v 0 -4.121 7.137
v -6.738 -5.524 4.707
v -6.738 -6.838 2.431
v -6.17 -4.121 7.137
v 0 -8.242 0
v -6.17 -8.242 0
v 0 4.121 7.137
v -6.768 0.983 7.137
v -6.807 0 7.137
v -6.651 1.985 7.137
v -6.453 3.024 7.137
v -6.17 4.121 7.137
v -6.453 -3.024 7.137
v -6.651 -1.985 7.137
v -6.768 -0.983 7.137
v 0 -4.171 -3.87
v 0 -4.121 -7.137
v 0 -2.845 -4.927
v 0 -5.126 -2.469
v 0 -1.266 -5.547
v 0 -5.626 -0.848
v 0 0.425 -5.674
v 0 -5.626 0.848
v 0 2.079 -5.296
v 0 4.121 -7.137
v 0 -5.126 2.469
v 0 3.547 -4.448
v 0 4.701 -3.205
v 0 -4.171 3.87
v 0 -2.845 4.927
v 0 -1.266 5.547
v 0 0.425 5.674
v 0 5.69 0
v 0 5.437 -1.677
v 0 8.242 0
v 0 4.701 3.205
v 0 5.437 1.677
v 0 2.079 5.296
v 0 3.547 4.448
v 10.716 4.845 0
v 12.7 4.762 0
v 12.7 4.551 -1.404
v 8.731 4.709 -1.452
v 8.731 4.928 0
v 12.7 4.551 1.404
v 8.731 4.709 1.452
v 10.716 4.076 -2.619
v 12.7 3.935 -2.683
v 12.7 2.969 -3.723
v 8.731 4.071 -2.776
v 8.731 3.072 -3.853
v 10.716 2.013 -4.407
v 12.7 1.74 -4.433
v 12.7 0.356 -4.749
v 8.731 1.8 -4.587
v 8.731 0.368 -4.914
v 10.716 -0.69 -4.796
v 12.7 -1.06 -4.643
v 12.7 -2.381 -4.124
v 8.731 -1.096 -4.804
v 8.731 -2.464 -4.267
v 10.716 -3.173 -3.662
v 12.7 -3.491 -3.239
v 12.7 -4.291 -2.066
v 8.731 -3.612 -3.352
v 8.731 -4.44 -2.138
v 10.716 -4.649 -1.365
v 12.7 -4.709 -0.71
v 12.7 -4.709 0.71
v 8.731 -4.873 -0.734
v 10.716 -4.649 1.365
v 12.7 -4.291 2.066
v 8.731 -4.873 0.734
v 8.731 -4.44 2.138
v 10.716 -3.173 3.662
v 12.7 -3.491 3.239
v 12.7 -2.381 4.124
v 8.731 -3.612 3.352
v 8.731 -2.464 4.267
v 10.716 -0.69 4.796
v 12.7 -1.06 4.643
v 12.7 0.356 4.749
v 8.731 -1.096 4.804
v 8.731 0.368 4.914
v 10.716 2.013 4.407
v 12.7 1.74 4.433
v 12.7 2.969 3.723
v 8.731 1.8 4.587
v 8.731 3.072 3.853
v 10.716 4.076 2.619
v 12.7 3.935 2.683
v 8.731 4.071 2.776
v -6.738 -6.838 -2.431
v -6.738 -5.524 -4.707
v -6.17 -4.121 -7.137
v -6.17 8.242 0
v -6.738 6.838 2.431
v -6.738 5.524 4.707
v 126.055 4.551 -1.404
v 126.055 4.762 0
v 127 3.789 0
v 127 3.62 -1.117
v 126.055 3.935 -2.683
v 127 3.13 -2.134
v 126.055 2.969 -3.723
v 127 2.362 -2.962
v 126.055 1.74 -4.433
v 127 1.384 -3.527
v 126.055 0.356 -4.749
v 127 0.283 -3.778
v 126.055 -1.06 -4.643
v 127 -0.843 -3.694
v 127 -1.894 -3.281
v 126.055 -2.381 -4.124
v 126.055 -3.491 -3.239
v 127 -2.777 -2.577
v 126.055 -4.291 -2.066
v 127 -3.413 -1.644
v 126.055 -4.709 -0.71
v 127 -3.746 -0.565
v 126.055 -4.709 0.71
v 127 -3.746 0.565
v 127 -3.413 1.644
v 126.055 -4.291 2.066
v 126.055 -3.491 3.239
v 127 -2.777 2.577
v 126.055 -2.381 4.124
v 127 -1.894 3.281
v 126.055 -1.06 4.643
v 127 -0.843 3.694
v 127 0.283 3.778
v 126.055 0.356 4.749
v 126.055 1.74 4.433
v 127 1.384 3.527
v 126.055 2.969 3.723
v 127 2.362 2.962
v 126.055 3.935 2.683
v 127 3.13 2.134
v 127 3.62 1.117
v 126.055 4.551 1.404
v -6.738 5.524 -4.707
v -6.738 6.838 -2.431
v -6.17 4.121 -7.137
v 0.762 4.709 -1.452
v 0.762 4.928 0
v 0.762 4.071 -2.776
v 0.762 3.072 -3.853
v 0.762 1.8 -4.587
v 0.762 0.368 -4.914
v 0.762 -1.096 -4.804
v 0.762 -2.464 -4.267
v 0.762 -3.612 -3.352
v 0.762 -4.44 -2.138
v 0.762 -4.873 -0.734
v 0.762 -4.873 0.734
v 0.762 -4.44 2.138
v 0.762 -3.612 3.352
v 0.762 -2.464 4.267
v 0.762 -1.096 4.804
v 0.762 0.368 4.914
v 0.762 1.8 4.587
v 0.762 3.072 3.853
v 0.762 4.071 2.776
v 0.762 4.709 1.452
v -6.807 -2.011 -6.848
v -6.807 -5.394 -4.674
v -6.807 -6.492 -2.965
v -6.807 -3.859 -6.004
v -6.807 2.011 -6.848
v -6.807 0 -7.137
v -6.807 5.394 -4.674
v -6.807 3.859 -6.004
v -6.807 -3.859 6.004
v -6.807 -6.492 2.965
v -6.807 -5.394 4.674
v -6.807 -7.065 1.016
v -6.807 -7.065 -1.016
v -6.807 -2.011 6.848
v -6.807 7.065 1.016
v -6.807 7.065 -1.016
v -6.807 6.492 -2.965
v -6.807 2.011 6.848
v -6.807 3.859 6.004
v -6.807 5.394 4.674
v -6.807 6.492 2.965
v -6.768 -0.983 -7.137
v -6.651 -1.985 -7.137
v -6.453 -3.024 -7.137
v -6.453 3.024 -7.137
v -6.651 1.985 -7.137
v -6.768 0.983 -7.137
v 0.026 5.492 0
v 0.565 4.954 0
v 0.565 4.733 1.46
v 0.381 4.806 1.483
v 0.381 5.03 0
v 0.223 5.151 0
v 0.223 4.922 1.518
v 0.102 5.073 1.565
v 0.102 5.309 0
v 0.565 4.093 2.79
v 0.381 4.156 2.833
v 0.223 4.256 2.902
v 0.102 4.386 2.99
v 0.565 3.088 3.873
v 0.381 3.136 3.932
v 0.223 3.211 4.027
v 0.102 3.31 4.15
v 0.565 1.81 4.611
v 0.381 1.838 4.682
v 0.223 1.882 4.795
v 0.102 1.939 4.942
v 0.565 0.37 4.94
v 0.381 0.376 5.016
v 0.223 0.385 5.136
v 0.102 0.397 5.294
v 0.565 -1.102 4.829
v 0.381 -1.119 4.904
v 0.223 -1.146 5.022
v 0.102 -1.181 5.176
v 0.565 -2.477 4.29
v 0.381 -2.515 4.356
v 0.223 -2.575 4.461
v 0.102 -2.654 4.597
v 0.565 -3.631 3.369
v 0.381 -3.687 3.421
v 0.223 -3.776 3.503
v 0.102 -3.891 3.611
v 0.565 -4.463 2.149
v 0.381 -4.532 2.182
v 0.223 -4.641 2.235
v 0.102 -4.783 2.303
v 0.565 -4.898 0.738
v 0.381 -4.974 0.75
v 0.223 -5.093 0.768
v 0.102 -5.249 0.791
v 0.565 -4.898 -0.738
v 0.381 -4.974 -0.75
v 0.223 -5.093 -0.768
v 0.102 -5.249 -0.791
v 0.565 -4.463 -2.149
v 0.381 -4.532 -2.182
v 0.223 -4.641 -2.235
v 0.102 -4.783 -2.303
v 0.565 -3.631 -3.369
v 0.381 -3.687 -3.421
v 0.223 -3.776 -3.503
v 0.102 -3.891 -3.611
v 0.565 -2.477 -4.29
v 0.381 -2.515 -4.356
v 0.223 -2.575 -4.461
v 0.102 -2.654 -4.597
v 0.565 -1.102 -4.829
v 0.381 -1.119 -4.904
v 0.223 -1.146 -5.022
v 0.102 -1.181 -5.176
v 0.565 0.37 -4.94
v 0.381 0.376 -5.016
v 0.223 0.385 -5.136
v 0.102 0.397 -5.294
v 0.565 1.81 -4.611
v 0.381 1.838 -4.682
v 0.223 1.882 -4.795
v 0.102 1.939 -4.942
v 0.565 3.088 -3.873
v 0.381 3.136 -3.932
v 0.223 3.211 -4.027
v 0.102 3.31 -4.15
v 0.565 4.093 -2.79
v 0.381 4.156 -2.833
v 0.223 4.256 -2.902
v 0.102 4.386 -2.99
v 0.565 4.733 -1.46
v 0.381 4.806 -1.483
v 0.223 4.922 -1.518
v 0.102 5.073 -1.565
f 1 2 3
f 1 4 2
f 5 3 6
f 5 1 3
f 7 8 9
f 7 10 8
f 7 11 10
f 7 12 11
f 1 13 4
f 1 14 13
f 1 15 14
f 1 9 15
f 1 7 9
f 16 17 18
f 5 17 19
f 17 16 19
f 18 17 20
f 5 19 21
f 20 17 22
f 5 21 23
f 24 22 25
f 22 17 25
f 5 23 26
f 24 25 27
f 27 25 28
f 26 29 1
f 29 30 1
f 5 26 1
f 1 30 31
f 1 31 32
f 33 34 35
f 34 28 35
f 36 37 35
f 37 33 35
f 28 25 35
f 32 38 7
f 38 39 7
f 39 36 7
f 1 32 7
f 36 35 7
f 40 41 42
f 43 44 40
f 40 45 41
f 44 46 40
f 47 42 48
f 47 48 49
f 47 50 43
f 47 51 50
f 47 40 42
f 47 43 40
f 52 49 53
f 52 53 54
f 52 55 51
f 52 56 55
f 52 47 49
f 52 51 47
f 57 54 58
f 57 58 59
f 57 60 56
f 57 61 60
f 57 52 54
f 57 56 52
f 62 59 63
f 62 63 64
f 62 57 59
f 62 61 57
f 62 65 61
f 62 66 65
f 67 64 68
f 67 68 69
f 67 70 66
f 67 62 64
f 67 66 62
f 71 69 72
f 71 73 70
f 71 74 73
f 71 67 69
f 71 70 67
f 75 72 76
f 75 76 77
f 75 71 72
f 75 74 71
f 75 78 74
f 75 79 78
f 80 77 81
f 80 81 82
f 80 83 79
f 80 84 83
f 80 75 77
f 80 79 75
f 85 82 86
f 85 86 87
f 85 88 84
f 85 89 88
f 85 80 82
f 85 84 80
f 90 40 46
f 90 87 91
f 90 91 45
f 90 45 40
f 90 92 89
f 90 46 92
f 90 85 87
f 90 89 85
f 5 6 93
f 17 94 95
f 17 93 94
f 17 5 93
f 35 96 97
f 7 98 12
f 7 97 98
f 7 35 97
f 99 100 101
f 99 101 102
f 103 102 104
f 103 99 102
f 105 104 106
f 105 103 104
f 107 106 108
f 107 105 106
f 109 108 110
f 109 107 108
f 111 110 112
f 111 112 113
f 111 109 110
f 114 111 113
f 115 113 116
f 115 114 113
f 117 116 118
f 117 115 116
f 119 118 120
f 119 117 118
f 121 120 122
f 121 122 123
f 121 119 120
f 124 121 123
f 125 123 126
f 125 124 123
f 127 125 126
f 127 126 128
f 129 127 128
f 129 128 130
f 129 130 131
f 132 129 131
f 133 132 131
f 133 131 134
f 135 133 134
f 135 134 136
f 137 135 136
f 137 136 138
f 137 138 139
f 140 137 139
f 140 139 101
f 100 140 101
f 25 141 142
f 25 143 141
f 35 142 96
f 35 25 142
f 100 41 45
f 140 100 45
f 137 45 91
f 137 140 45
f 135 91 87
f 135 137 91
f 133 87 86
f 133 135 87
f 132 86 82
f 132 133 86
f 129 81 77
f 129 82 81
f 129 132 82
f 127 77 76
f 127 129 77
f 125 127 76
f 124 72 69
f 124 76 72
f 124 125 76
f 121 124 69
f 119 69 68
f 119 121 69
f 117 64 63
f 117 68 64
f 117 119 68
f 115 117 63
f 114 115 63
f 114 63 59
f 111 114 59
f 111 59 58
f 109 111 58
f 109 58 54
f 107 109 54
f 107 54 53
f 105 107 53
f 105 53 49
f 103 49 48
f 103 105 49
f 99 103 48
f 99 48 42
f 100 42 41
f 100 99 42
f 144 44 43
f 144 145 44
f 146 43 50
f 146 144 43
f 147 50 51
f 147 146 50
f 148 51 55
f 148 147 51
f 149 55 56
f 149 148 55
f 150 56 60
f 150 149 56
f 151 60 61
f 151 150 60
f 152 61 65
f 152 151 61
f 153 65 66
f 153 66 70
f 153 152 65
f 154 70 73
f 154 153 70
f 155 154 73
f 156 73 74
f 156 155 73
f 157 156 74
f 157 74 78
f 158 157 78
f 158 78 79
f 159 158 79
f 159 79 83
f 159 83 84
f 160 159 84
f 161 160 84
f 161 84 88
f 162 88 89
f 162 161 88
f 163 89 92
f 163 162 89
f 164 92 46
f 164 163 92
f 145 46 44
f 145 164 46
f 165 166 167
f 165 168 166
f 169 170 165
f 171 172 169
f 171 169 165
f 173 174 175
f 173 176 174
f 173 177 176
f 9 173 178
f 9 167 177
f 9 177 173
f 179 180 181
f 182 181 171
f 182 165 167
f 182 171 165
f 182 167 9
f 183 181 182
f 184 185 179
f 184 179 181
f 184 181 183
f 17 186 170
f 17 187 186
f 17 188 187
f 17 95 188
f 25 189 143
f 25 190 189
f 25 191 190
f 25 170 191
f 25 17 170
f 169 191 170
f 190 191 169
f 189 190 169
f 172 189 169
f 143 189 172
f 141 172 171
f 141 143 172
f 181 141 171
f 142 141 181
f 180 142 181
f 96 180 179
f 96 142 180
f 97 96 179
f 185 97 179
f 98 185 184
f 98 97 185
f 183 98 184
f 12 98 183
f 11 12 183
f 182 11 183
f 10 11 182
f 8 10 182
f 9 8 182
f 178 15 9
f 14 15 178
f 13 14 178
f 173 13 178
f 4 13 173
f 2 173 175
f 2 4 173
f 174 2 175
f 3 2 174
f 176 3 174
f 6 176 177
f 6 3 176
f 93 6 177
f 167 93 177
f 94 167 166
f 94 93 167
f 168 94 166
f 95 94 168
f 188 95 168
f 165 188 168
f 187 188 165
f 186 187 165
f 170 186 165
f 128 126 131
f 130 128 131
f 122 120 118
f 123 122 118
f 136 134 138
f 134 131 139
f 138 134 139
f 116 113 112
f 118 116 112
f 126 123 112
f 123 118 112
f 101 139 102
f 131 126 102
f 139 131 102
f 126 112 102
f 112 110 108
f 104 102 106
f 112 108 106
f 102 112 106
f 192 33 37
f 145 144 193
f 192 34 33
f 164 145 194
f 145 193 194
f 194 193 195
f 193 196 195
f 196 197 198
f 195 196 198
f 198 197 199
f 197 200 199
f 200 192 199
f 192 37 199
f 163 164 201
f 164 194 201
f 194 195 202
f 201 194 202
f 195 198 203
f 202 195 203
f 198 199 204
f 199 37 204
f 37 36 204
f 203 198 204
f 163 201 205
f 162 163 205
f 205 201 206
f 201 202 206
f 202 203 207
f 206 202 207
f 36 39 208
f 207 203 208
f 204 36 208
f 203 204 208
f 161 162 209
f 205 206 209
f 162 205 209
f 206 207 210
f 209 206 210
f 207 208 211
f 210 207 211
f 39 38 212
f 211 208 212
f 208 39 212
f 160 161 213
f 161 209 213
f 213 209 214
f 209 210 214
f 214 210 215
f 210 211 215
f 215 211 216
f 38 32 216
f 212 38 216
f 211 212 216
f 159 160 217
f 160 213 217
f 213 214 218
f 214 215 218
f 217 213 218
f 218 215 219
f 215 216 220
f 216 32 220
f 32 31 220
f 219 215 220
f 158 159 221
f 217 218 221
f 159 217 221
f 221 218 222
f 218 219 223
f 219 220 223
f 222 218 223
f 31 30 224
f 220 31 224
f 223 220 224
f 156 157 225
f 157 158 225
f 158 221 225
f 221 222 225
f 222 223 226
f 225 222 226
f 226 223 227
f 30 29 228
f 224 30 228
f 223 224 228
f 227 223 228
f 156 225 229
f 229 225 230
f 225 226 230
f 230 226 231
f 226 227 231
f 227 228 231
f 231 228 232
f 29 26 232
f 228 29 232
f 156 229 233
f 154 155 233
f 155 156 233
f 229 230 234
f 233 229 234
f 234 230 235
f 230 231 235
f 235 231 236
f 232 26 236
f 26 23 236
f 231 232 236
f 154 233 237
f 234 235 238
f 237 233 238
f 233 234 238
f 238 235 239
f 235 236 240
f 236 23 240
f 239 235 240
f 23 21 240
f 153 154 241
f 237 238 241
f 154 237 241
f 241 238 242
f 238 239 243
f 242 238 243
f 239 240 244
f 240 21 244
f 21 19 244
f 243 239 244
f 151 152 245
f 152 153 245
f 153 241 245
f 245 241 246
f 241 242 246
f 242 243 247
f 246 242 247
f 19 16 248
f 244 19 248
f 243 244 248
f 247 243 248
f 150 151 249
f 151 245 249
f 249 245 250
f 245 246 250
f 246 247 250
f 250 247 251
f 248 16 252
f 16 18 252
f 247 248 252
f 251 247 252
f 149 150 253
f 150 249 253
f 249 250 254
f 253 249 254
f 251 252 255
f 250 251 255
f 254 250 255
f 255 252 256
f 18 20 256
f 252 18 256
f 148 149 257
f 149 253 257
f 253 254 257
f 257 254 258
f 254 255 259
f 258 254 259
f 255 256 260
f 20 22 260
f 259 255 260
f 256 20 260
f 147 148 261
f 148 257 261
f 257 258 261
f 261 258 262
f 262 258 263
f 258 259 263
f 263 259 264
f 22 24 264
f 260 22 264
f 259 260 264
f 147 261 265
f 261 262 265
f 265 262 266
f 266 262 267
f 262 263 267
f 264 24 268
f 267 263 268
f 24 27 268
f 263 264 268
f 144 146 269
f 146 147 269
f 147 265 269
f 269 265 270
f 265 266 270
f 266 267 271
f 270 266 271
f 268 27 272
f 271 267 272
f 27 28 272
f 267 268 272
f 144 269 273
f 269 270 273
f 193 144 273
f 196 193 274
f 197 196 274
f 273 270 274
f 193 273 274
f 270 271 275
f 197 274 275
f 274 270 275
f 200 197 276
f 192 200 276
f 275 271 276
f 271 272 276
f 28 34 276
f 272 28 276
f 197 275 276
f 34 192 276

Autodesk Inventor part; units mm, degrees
ref_plane "YZ Plane" through (0, 0, 0) normal (1, 0, 0) x (0, 1, 0)
ref_plane "XZ Plane" through (0, 0, 0) normal (0, 1, 0) x (-1, 0, 0)
sketch "Sketch1" plane through (0, 0, 0) normal (0, 0, 1) x (1, 0, 0)
  line L0 (0, 7.1374) -> (0, 4.9276)
  line L1 (12.7, 4.7625) -> (127, 4.7625)
  line L2 (127, 4.7625) -> (127, 0)
  line L3 (127, 0) -> (-0.0001, 0)
  line L4 (-25.4001, 0) -> (152.4, 0) projected
  line L5 (-0.0001, 0) -> (-0.0001, 7.1374)
  line L6 (-0.0001, 7.1374) -> (0, 7.1374)
  line L7 (12.7, 4.7625) -> (8.7311, 4.9276)
  line L8 (8.7311, 4.9276) -> (0, 4.9276)
  line L9 (0, -1.4275) -> (0, 8.5649) projected
  dimension "d0" = 127
  dimension "d1" = 114.3
revolve "Body" add sketch "Sketch1" angle 360 about axis through (127, 0, 0) along (-1, 0, 0)
sketch "Sketch2" plane through (-0.0001, 0, 0) normal (-1, 0, 0) x (0, 0, 1)
  line L0 (0, 8.2416) -> (7.1374, 4.1208)
  line L1 (7.1374, 4.1208) -> (7.1374, -4.1208)
  line L2 (7.1374, -4.1208) -> (0, -8.2416)
  line L3 (0, -8.2416) -> (-7.1374, -4.1208)
  line L4 (-7.1374, -4.1208) -> (-7.1374, 4.1208)
  line L5 (-7.1374, 4.1208) -> (0, 8.2416)
  point P0 (0, 0)
  point P1 (0, 0)
  dimension "d11" = 14.2748
extrude "Head" add sketch "Sketch2" along normal blind 6.8072
sketch "Sketch4" plane through (0, 0, 0) normal (0, 0, 1) x (1, 0, 0)
  line L0 (-6.8073, 7.1374) -> (-6.8073, 8.2416)
  line L1 (-6.8073, 8.2416) -> (-6.1698, 8.2416)
  line L2 (-6.1698, 8.2416) -> (-6.8073, 7.1374)
  line L3 (-8.1687, 0) -> (1.3613, 0) projected
  line L4 (-0.0001, 8.2416) -> (-6.8073, 8.2416) projected
  line L5 (-6.8073, 4.1208) -> (-6.8073, 8.2416) projected
  dimension "d5" = 30
  dimension "d19" = 14.2748
revolve "Chamfer1" cut sketch "Sketch4" angle 360 about axis through (-10, 0, 0) along (1, 0, 0)
thread "Thread" size "3/8-16 UNC" class "2A" standard "ANSI Unified Screw Threads" full length
chamfer "Chamfer2" distance 0.9739 distance2 0.9447 1 edges at (127, -4.7625, 0) measured on face at (127, -0.1914, -0.5295)
ref_plane "Work Plane1" through (1.525, 0, 0) normal (0, 0, 1) x (1, 0, 0)
fillet "Fillet2" radius 0.762 1 edges at (0, -4.9276, 0)
equation "\"d11\" = SW"
equation "\"d3\" = KOH - SD"
equation "\"d63\" = R"
equation "\"d15\" = GEL"
equation "\"d6\" = -0.5 * SPD + 0.5 * GD"
equation "\"d5\" = ANG1"
equation "\"d19\" = SW0"
equation "\"NLG\" = 190.5"
equation "\"GD\" = NND"
equation "\"BDM\" = 9.8552"
equation "\"KOH\" = 6.8072"
equation "\"GEL\" = 31.75"
equation "\"SW\" = 14.2748"
equation "\"SW0\" = SW"
equation "\"SPD\" = GD1"
equation "\"SD2\" = SW"
equation "\"SD\" = 0"
equation "\"ANG1\" = 30deg"
equation "\"GAL\" = 3.96875"
equation "\"GUL\" = 0.238 * GAL"
equation "\"R\" = 0.762"
equation "\"d62\" = -NLG - SD + GUL"
equation "\"GD1\" = 7.5773"
equation "\"THREADDIA\" = 9.525"
equation "\"TOA\" = 30deg"
equation "\"NND\" = 9.525"
equation "\"E0\" = 1.155 * SW"
properties part number "am-1055" material "Steel, Mild"
